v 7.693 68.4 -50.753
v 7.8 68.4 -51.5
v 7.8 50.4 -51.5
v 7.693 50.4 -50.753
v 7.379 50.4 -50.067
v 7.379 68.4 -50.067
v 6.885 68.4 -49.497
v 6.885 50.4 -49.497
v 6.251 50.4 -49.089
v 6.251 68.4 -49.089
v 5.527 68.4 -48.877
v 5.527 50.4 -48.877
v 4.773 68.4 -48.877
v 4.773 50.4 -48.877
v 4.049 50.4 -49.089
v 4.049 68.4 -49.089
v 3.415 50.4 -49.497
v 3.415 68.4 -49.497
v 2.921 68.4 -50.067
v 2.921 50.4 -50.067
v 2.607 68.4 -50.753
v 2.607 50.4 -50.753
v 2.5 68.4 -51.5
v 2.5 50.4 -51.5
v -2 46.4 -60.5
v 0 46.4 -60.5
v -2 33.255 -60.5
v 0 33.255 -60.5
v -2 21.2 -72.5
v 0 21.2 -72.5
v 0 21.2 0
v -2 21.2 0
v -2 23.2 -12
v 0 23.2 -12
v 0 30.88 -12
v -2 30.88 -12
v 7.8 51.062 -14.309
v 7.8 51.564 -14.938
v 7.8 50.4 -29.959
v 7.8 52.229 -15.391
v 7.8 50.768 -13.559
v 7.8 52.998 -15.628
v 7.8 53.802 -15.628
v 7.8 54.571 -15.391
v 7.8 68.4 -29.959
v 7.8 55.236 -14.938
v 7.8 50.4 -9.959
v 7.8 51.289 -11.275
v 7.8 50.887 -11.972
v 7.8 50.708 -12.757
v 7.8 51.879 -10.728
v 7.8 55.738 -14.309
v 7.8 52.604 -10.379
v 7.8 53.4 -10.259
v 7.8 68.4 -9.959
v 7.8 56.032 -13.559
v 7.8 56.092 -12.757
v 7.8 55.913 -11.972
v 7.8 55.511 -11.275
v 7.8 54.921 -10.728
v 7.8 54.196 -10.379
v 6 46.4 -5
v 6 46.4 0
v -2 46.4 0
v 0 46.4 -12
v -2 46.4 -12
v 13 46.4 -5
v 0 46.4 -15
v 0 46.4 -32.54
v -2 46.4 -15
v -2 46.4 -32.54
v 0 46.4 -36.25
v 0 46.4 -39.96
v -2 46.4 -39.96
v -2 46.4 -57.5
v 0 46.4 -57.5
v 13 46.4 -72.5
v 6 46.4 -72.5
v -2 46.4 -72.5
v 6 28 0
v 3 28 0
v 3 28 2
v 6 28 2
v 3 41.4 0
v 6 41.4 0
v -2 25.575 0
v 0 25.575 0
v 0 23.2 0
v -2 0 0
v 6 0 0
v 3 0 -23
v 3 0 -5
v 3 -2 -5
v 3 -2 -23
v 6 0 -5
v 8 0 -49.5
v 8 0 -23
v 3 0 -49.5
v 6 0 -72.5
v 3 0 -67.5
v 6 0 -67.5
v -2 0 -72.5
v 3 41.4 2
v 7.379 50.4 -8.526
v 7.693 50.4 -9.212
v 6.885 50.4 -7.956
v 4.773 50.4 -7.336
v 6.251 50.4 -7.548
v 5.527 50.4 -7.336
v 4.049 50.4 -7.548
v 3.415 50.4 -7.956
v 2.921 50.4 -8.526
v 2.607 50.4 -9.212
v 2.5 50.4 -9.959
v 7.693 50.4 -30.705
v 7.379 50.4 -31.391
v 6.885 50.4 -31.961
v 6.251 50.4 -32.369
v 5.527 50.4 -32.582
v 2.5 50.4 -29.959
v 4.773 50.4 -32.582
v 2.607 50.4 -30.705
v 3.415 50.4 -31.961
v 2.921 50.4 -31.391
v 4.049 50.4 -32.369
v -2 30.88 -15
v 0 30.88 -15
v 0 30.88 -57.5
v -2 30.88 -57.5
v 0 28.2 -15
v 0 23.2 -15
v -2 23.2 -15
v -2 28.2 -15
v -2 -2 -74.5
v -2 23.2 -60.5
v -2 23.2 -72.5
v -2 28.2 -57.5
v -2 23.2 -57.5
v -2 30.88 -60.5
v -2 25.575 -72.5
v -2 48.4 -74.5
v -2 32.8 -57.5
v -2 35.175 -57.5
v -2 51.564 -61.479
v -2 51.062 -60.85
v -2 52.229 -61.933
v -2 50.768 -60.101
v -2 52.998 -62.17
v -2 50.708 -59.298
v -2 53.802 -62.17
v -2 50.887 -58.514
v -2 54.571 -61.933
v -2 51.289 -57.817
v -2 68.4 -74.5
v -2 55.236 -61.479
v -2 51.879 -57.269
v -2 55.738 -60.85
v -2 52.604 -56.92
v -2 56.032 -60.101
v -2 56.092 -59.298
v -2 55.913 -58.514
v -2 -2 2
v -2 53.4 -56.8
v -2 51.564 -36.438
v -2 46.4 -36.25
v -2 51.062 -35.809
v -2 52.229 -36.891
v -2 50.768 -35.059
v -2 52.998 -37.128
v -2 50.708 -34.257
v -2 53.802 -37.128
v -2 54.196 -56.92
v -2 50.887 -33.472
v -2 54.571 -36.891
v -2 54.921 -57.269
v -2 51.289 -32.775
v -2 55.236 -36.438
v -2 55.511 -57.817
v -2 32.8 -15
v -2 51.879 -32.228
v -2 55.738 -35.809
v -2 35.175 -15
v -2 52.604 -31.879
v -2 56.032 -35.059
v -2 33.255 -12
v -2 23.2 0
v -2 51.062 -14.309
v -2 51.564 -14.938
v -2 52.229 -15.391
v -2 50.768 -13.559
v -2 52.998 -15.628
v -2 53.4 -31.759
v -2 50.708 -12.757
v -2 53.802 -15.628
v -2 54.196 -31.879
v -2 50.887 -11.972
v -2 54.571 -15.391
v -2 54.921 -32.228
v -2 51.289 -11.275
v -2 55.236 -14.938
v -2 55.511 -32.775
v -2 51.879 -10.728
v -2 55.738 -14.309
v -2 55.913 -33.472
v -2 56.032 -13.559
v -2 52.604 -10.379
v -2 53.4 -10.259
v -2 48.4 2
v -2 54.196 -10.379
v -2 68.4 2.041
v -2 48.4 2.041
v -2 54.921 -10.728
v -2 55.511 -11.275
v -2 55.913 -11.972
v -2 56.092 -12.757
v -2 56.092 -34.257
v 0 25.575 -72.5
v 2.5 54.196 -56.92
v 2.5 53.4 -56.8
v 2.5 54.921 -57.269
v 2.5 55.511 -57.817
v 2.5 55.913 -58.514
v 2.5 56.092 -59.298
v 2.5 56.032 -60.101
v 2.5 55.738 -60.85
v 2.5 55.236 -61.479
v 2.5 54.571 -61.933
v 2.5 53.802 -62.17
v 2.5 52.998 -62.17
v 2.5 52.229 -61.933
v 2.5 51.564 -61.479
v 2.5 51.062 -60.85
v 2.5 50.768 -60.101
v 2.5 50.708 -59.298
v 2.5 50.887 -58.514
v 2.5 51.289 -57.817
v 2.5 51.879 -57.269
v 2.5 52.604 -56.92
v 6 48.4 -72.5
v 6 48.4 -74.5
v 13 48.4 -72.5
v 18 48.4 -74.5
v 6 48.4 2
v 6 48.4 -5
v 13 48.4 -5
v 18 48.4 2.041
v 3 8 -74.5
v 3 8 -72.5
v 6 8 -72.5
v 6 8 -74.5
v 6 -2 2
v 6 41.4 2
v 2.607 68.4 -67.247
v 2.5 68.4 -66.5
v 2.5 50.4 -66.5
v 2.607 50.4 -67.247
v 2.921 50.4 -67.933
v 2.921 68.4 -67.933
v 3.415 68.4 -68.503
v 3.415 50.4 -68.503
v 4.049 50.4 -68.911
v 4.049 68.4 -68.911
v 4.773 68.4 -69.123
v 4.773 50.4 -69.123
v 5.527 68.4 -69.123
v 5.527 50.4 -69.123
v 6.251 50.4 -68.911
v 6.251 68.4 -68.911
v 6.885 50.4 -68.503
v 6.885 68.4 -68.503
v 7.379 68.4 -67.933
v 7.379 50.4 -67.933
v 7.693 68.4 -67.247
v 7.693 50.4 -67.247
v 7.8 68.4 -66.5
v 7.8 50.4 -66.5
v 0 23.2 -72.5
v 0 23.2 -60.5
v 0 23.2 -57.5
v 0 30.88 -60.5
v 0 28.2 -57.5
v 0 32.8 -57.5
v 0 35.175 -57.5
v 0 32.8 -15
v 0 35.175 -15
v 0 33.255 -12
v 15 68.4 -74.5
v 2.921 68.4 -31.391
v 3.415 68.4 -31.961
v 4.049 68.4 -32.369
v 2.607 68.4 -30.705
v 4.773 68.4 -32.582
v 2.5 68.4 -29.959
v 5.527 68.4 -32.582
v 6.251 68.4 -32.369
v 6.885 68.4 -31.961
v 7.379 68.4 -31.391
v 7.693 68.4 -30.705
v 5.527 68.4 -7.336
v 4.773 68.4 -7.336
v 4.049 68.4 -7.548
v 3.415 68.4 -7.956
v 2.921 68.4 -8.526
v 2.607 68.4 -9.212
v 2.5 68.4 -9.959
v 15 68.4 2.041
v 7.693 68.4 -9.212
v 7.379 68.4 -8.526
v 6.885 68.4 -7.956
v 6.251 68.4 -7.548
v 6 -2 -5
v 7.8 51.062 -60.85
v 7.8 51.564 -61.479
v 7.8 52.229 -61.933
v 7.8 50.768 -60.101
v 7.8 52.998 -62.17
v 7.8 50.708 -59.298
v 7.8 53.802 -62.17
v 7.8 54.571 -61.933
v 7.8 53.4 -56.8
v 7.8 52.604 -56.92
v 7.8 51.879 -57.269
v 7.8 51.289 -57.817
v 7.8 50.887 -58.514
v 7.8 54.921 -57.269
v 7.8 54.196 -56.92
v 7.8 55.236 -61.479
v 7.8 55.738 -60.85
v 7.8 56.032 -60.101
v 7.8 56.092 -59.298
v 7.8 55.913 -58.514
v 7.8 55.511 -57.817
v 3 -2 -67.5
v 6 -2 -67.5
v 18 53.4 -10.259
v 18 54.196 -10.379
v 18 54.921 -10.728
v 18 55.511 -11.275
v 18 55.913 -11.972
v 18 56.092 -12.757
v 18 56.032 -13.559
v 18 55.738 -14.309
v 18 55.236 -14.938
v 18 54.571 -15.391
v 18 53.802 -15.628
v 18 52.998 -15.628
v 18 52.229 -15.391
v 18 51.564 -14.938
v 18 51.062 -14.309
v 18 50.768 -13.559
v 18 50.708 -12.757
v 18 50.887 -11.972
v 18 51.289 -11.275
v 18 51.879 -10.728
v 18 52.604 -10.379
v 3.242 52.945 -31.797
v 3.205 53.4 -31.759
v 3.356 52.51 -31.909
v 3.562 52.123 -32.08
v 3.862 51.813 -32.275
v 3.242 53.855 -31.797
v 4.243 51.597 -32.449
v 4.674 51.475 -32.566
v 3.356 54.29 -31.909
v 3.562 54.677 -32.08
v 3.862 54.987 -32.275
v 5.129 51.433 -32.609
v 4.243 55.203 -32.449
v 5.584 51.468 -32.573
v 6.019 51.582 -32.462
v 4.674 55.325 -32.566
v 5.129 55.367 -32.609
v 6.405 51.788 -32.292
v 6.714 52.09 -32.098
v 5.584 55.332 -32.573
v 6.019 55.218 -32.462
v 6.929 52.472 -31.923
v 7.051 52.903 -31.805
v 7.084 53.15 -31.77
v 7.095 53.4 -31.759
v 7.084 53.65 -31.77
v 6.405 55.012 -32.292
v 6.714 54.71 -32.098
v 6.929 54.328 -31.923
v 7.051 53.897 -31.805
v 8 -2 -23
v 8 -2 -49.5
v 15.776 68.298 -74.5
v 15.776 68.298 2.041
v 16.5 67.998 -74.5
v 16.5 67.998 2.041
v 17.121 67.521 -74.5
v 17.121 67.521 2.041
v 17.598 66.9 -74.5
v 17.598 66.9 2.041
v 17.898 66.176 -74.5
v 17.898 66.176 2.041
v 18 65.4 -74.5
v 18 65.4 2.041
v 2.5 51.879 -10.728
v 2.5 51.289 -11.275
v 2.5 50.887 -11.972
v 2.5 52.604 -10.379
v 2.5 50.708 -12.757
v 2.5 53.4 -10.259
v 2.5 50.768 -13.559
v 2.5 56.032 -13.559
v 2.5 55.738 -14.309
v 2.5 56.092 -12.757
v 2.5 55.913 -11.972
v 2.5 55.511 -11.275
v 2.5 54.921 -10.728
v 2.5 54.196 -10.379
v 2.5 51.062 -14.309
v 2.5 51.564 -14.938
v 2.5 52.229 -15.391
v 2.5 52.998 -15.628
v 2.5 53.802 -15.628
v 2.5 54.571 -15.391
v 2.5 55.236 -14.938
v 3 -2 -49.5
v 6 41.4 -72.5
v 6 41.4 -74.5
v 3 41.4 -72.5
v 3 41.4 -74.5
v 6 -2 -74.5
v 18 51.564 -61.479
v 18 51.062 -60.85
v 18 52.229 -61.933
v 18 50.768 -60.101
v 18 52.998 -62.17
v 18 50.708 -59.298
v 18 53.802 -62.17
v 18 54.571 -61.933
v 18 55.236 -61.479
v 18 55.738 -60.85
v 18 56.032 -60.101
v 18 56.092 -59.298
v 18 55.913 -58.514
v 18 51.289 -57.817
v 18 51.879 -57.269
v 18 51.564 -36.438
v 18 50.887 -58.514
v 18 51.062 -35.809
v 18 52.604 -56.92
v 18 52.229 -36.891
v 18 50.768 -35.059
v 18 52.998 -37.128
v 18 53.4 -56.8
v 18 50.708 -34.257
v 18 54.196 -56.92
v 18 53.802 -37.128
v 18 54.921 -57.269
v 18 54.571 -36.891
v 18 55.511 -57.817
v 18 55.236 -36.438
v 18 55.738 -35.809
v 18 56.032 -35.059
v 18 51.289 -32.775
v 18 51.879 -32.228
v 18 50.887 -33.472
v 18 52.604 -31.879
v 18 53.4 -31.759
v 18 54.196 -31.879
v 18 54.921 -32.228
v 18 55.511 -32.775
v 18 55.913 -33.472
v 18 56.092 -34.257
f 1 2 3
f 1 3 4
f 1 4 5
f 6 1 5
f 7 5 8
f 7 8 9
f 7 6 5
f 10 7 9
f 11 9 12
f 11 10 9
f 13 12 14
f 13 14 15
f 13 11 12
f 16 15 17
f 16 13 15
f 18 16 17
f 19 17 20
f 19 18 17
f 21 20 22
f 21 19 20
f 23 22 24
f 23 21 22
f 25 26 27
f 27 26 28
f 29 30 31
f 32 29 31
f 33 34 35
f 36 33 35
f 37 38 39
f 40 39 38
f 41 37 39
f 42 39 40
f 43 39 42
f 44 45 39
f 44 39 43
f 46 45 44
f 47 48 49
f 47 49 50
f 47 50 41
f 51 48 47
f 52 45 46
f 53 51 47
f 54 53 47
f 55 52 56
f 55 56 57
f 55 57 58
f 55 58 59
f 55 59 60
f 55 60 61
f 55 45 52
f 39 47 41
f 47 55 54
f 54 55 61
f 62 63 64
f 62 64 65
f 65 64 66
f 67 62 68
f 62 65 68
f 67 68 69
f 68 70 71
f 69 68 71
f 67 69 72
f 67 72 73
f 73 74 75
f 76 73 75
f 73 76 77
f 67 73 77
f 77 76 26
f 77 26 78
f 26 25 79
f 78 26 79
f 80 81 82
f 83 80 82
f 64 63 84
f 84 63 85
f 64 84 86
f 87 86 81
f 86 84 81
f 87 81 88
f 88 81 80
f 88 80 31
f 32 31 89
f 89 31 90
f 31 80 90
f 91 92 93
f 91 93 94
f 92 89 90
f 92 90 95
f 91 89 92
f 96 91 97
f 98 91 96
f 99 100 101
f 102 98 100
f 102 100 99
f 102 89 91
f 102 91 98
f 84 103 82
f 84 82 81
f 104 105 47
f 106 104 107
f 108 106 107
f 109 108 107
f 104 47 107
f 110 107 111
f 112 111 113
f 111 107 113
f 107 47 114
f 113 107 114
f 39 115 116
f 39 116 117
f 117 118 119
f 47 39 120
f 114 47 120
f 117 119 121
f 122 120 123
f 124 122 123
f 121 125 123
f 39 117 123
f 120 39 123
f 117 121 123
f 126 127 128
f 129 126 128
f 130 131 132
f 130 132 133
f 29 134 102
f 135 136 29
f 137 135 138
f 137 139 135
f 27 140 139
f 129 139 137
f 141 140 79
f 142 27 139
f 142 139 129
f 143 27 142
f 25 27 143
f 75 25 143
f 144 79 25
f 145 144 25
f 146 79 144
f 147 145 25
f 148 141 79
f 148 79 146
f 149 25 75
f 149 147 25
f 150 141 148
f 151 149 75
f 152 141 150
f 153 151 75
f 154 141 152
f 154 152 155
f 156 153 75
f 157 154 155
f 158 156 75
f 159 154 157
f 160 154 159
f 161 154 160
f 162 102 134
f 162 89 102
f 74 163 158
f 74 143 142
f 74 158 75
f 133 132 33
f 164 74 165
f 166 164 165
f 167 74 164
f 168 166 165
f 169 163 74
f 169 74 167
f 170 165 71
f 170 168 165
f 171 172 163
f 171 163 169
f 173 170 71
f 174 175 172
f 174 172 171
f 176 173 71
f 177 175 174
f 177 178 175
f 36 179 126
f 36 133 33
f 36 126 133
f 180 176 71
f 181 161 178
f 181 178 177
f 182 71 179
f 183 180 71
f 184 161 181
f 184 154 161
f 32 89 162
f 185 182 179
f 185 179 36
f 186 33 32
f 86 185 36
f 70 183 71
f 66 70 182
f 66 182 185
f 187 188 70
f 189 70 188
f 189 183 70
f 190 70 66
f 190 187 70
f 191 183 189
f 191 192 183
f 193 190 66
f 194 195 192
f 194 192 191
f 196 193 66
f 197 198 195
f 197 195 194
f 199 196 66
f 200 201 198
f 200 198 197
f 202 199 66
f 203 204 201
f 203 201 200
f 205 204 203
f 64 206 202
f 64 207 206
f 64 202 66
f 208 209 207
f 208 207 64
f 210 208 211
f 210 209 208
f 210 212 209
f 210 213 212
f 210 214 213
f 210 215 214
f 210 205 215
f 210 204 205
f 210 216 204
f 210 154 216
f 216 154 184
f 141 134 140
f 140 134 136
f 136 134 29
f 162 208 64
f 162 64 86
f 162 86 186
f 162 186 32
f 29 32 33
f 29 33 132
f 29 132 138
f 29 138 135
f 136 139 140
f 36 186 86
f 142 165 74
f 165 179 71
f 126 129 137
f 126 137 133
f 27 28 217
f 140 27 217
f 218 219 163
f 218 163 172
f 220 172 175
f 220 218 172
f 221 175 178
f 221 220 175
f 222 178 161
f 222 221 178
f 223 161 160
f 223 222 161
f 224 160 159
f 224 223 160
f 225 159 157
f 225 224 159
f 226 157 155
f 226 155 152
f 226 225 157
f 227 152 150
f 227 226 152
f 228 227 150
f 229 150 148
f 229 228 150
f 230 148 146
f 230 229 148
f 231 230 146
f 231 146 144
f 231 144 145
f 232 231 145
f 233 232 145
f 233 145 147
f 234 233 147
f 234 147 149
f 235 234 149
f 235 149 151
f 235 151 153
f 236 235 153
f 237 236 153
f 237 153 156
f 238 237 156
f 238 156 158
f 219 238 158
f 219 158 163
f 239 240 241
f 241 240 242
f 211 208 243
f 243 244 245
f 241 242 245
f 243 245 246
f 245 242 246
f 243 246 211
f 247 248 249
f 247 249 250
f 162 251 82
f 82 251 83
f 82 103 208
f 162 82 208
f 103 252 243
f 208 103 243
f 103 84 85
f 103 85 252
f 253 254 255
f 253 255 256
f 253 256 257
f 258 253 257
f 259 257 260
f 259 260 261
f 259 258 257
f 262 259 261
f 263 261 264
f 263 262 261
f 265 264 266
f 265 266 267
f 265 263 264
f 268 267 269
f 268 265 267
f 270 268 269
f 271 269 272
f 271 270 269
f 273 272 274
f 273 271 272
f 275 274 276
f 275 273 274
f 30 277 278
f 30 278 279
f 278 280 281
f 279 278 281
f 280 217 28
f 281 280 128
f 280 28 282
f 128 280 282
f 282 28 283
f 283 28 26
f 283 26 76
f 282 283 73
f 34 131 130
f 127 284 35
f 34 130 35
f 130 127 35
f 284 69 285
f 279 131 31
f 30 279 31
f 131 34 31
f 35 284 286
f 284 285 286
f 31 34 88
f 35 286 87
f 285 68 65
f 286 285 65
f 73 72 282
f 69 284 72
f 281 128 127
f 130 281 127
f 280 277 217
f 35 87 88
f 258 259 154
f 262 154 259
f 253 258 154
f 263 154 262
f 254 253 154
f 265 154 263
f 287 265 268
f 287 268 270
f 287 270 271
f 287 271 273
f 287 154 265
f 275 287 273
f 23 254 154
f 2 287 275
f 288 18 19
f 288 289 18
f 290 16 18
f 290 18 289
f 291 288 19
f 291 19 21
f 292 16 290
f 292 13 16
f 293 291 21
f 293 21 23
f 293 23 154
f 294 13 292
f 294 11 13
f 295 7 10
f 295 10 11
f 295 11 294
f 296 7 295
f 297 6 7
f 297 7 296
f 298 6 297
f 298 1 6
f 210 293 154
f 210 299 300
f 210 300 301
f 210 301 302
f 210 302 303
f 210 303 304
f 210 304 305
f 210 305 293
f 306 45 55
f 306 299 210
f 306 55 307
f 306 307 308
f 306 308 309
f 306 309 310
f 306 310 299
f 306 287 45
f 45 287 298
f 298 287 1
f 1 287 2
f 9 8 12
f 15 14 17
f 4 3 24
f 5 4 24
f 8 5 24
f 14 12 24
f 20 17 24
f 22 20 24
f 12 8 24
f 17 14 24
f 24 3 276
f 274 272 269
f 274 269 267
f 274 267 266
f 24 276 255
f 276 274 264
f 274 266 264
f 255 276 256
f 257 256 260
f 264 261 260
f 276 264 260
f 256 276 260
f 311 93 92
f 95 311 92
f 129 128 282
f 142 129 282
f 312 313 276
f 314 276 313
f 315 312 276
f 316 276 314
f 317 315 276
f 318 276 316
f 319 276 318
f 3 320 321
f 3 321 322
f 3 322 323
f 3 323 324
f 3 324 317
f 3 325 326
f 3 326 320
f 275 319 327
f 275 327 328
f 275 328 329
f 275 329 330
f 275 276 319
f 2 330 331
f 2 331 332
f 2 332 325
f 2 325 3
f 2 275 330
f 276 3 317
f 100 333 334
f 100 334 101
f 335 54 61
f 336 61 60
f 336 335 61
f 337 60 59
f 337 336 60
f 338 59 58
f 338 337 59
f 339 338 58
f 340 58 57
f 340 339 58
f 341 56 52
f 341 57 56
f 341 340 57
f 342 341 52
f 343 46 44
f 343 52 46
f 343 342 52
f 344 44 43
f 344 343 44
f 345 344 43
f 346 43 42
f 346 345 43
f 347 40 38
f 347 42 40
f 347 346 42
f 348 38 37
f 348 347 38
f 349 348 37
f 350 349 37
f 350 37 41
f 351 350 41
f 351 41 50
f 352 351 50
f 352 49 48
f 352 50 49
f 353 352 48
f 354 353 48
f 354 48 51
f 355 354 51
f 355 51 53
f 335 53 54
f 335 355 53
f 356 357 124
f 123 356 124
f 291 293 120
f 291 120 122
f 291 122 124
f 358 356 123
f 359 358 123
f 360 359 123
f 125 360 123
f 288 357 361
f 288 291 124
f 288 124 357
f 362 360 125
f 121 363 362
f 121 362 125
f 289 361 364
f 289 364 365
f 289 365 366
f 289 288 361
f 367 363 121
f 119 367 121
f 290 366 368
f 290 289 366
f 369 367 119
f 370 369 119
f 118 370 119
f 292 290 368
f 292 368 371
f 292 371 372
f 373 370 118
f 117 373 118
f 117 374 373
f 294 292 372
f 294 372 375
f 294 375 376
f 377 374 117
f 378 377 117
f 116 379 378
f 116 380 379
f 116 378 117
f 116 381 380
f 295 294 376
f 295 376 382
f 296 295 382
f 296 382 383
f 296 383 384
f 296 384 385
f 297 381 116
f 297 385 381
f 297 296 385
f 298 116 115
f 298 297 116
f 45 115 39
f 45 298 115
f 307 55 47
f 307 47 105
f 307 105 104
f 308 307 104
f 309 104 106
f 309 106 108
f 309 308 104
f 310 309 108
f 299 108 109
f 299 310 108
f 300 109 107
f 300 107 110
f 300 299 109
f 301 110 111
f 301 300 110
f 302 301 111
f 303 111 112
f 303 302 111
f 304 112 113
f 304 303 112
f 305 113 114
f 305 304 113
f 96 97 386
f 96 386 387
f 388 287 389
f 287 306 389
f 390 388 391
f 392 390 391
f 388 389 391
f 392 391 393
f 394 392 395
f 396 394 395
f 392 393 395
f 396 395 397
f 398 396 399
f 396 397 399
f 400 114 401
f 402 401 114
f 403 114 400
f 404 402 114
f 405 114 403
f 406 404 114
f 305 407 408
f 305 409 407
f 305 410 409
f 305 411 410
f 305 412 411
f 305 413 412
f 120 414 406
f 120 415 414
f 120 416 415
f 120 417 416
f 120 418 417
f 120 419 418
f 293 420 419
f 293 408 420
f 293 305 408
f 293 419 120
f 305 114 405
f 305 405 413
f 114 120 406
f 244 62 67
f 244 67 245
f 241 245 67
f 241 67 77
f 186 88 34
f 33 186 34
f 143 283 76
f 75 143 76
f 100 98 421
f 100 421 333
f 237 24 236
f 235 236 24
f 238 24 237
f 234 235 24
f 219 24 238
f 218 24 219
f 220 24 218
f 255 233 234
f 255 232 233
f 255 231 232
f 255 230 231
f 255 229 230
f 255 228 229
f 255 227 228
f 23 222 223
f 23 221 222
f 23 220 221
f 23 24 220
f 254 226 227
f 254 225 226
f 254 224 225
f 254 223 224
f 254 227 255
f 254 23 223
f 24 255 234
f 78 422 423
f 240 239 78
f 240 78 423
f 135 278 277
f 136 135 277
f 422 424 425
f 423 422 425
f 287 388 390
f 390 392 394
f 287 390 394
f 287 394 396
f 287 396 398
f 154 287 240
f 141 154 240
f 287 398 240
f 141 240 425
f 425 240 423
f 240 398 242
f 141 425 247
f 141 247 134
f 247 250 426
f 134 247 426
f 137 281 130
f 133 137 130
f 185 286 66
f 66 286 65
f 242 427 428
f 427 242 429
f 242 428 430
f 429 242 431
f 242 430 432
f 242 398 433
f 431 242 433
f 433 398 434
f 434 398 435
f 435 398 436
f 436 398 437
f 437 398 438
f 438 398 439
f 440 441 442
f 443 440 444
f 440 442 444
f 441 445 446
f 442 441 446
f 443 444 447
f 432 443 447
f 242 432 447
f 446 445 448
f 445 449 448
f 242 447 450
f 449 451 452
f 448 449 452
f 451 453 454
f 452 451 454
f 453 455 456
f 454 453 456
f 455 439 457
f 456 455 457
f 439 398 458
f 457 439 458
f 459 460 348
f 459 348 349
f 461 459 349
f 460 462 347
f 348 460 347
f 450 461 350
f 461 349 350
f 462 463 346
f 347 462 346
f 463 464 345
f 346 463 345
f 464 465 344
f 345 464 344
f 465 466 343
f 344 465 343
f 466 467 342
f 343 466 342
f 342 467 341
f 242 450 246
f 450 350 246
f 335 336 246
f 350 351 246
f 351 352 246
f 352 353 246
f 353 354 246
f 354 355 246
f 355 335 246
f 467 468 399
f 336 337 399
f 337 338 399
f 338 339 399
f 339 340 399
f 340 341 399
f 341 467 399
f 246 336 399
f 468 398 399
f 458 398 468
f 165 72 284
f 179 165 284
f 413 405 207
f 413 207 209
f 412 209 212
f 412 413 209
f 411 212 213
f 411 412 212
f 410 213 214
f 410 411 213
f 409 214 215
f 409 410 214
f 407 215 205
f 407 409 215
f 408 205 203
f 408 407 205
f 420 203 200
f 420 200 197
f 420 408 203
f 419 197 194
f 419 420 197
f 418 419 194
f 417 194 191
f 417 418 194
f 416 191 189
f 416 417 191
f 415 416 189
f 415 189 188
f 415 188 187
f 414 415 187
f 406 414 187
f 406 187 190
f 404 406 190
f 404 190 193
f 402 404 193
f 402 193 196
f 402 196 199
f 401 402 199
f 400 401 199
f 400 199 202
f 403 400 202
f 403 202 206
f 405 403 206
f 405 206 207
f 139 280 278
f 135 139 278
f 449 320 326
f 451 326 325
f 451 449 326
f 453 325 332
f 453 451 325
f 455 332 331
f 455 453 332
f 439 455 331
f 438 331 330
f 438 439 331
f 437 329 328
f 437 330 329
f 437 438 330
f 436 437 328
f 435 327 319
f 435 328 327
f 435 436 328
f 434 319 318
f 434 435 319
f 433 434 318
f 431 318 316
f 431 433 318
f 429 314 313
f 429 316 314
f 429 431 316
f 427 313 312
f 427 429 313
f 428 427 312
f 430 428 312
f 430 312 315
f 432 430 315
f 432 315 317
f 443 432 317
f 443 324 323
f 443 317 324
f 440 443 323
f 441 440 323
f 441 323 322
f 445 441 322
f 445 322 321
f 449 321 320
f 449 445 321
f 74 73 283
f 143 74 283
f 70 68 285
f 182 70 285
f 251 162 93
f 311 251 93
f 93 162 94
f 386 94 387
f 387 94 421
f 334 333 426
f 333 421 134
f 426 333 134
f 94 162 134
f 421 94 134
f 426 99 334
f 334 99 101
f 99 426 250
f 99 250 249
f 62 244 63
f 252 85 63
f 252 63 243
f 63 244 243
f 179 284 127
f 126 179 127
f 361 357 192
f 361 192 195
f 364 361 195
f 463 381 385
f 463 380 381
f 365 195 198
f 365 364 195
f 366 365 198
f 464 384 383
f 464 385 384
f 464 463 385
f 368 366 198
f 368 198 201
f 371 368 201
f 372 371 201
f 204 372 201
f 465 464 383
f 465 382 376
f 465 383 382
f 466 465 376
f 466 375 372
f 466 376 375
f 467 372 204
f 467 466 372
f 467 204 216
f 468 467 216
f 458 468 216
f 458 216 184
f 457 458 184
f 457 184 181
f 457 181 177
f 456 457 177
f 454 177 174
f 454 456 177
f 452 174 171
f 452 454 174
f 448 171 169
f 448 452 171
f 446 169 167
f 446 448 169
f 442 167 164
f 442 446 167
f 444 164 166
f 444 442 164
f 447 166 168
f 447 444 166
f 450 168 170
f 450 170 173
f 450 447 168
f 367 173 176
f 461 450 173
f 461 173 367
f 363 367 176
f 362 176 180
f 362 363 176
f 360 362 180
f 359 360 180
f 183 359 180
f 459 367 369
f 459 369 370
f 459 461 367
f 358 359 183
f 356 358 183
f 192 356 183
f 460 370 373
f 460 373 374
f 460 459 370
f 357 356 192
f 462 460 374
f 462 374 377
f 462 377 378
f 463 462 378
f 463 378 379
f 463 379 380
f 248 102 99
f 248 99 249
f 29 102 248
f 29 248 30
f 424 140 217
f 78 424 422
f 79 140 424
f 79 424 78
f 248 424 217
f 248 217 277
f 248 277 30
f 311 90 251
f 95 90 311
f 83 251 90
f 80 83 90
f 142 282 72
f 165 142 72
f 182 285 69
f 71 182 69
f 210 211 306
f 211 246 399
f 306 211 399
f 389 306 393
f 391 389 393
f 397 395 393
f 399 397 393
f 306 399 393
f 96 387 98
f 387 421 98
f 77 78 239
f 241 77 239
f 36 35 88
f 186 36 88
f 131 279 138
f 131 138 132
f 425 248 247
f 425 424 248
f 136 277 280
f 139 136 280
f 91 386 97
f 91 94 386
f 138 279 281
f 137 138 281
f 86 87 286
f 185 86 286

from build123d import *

# Parameters (mm, degrees)
SKETCH_1_W           = 76.5
SKETCH_1_H           = 50.4
SKETCH_1_W_2         = 72.5
SKETCH_1_H_2         = 46.4
EXTRUDE_1_DEPTH      = 3
SKETCH_2_W           = 26.5
SKETCH_2_H           = 2
SKETCH_2_W_2         = 2
SKETCH_2_H_2         = 7
EXTRUDE_2_DEPTH      = 3
EXTRUDE_4_DEPTH      = 2
EXTRUDE_4_DEPTH_BACK = 18
SKETCH_3_W           = 76.541364071
SKETCH_3_H           = 20
SKETCH_3_R           = 2.7
FILLET_1_R           = 3
CUT_EXTRUDE_1_DEPTH  = 18
SKETCH_5_W           = 42.5
SKETCH_5_H           = 5
EXTRUDE_5_DEPTH      = 2
EXTRUDE_6_DEPTH      = 2
SKETCH_7_W           = 26.5
SKETCH_7_H           = 2
EXTRUDE_7_DEPTH      = 2
SKETCH_8_W           = 67.5
SKETCH_8_H           = 2
EXTRUDE_8_DEPTH      = 10


with BuildPart() as part:
    # 草图1 → 凸台-拉伸1 (new body)
    with BuildSketch(Plane(origin=(0, 0, 0), x_dir=(0, 0, -1), z_dir=(1, 0, 0))):
        with Locations((36.25, 23.2)):
            Rectangle(SKETCH_1_W, SKETCH_1_H)
        with Locations((36.25, 23.2)):
            Rectangle(SKETCH_1_W_2, SKETCH_1_H_2, mode=Mode.SUBTRACT)
    extrude(amount=EXTRUDE_1_DEPTH)

    # 草图2 → 凸台-拉伸2 (add)
    with BuildSketch(Plane(origin=(3, 0, 0), x_dir=(0, 0, -1), z_dir=(1, 0, 0))):
        with Locations((36.25, -1)):
            Rectangle(SKETCH_2_W, SKETCH_2_H)
        Polygon((-2, -2), (0, -2), (5, -2), (5, 0), (0, 0), (0, 28), (-2, 28), align=None)
        Polygon((74.5, -2), (72.5, -2), (67.5, -2), (67.5, 0), (72.5, 0), (72.5, 8), (74.5, 8), align=None)
        Polygon((-2, 48.4), (5, 48.4), (5, 46.4), (0, 46.4), (0, 41.4), (-2, 41.4), (-2, 46.4), align=None)
        with Locations((73.5, 44.9)):
            Rectangle(SKETCH_2_W_2, SKETCH_2_H_2)
    extrude(amount=EXTRUDE_2_DEPTH)

    # 草图3 → 凸台-拉伸4 (add, two sides: drawn at the far end of the back side and taken through both)
    with BuildSketch(Plane.ZY.offset(-EXTRUDE_4_DEPTH_BACK)):
        with Locations((-36.229317964, 58.4)):
            Rectangle(SKETCH_3_W, SKETCH_3_H)
        with Locations((-59.5, 53.4)):
            Circle(SKETCH_3_R, mode=Mode.SUBTRACT)
        with Locations((-12.958635929, 53.4)):
            Circle(SKETCH_3_R, mode=Mode.SUBTRACT)
        with Locations((-34.458635929, 53.4)):
            Circle(SKETCH_3_R, mode=Mode.SUBTRACT)
    extrude(amount=EXTRUDE_4_DEPTH + EXTRUDE_4_DEPTH_BACK)

    # 圆角1
    fillet_1_edges = [part.edges().sort_by_distance(p)[0] for p in [
        (18, 68.4, -36.229317964),
    ]]
    fillet(fillet_1_edges, radius=FILLET_1_R)

    # 草图4 → 切除-拉伸1 (cut)
    with BuildSketch(Plane(origin=(0, 68.4, 0), x_dir=(1, 0, 0), z_dir=(0, 1, 0))):
        with BuildLine():
            Line((7.8, 66.5), (7.8, 51.5))
            ThreePointArc((7.8, 51.5), (5.15, 48.85), (2.5, 51.5))
            Line((2.5, 51.5), (2.5, 66.5))
            ThreePointArc((2.5, 66.5), (5.15, 69.15), (7.8, 66.5))
        make_face()
        with BuildLine():
            Line((7.8, 29.958635929), (7.8, 9.958635929))
            ThreePointArc((7.8, 9.958635929), (5.15, 7.308635929), (2.5, 9.958635929))
            Line((2.5, 9.958635929), (2.5, 29.958635929))
            ThreePointArc((2.5, 29.958635929), (5.15, 32.608635929), (7.8, 29.958635929))
        make_face()
    extrude(amount=-CUT_EXTRUDE_1_DEPTH, mode=Mode.SUBTRACT)

    # 草图5 → 凸台-拉伸5 (add)
    with BuildSketch(Plane.ZY):
        Polygon((-35.66479448, 48.4), (-36.83520552, 48.4), (-57.5, 35.174531533), (-57.5, 48.4), (-60.5, 48.4), (-60.5, 33.254531533), (-74.5, 24.294531533), (-74.5, 21.2), (2, 21.2), (2, 24.294531533), (-12, 33.254531533), (-12, 48.4), (-15, 48.4), (-15, 35.174531533), align=None)
        Polygon((-60.5, 23.2), (-72.5, 23.2), (-60.5, 30.88), align=None, mode=Mode.SUBTRACT)
        with Locations((-36.25, 25.7)):
            Rectangle(SKETCH_5_W, SKETCH_5_H, mode=Mode.SUBTRACT)
        Polygon((-12, 30.88), (0, 23.2), (-12, 23.2), align=None, mode=Mode.SUBTRACT)
        Polygon((-57.5, 32.8), (-36.25, 46.4), (-15, 32.8), (-15, 30.88), (-57.5, 30.88), align=None, mode=Mode.SUBTRACT)
    extrude(amount=EXTRUDE_5_DEPTH)

    # 草图6 → 凸台-拉伸6 (add)
    with BuildSketch(Plane.ZY):
        Polygon((0, 46.4), (0, 25.574531533), (2, 24.294531533), (2, 48.4), (-12, 48.4), (-12, 46.4), align=None)
        Polygon((-74.5, 48.4), (-74.5, 24.294531533), (-72.5, 25.574531533), (-72.5, 46.4), (-60.5, 46.4), (-60.5, 48.4), align=None)
        Polygon((2, -2), (2, 21.2), (0, 21.2), (0, 0), (-72.5, 0), (-72.5, 21.2), (-74.5, 21.2), (-74.5, -2), align=None)
        Polygon((-15, 46.4), (-15, 48.4), (-35.66479448, 48.4), (-32.53979448, 46.4), align=None)
        Polygon((-57.5, 46.4), (-39.96020552, 46.4), (-36.83520552, 48.4), (-57.5, 48.4), align=None)
    extrude(amount=EXTRUDE_6_DEPTH)

    # 草图7 → 凸台-拉伸7 (add)
    with BuildSketch(Plane(origin=(6, 0, 0), x_dir=(0, 0, -1), z_dir=(1, 0, 0))):
        with Locations((36.25, -1)):
            Rectangle(SKETCH_7_W, SKETCH_7_H)
    extrude(amount=EXTRUDE_7_DEPTH)

    # 草图8 → 凸台-拉伸8 (add)
    with BuildSketch(Plane(origin=(3, 0, 0), x_dir=(0, 0, -1), z_dir=(1, 0, 0))):
        with Locations((38.75, 47.4)):
            Rectangle(SKETCH_8_W, SKETCH_8_H)
    extrude(amount=EXTRUDE_8_DEPTH)


solid = part.part
